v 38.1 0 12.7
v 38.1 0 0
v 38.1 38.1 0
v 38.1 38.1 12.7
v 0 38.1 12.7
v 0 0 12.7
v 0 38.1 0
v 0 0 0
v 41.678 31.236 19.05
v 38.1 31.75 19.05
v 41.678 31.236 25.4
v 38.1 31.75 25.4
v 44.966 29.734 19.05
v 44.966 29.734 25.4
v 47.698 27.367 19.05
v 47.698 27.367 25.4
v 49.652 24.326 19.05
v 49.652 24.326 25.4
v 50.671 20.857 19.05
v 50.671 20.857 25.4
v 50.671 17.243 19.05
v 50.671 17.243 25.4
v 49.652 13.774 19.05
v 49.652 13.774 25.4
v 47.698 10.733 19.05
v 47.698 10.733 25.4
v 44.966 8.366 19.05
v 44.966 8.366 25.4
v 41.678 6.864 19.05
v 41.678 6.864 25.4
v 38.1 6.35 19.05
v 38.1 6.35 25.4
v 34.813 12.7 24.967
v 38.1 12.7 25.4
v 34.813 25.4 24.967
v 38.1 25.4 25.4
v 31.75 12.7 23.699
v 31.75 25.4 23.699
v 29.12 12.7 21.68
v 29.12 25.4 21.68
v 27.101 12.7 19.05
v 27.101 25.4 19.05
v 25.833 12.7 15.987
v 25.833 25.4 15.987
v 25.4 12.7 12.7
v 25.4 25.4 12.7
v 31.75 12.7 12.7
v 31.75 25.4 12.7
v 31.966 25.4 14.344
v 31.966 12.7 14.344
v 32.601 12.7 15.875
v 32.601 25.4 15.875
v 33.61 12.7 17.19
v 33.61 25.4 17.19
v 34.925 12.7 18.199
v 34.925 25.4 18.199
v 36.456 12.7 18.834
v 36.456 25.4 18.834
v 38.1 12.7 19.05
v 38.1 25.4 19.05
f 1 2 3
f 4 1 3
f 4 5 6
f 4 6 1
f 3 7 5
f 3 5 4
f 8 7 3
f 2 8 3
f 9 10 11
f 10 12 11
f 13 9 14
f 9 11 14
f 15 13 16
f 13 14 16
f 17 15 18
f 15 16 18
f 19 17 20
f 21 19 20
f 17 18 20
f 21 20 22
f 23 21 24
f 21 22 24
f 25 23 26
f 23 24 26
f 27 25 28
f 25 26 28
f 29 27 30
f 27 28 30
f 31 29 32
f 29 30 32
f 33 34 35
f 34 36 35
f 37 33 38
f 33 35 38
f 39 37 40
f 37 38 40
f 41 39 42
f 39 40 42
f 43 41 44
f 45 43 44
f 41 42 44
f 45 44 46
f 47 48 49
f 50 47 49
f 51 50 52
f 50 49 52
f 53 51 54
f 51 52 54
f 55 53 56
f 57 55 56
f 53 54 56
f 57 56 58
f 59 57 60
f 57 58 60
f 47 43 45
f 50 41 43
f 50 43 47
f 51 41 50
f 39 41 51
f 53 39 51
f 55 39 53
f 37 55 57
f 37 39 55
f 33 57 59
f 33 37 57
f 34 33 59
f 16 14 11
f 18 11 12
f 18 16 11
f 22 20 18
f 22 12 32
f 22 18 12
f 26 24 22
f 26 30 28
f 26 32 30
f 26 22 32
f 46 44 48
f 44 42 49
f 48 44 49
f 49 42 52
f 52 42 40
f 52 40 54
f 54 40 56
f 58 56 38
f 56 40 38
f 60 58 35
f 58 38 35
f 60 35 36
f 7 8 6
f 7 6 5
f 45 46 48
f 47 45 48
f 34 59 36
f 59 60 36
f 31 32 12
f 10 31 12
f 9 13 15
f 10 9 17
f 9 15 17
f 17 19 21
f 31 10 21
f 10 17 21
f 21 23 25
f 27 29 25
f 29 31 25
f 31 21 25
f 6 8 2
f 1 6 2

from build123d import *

# Parameters (mm, degrees)
F0_W          = 38.1
F0_H          = 38.1
F1_DEPTH      = 12.7
F4_DEPTH      = 6.35
F4_DEPTH_BACK = 6.35
F5_W          = 12.7
F5_H          = 6.35
F6_ANGLE_BACK = 90
F6_ANGLE      = 180


with BuildPart() as f1:
    # F0 (on Top) → F1 (new body)
    with BuildSketch(Plane.XY):
        with Locations((19.05, 19.05)):
            Rectangle(F0_W, F0_H)
    extrude(amount=F1_DEPTH)


with BuildPart() as f4:
    # F3 (on offset) → F4 (new body, two sides)
    with BuildSketch(Plane.XZ.offset(-19.05)) as f4_sk:
        with BuildLine():
            ThreePointArc((31.75, 12.7), (33.6098719395, 17.1901280605), (38.1, 19.05))
            Line((38.1, 19.05), (38.1, 25.4))
            ThreePointArc((38.1, 25.4), (29.1197438789, 21.6802561211), (25.4, 12.7))
            Line((25.4, 12.7), (31.75, 12.7))
        make_face()
    extrude(amount=-F4_DEPTH)
    extrude(f4_sk.sketch, amount=F4_DEPTH_BACK)


with BuildPart() as f6:
    # F5 (on offset) → F6 (revolve)
    with BuildSketch(Plane.XZ.offset(-19.05), mode=Mode.PRIVATE) as f6_sk:
        with Locations((44.45, 22.225)):
            Rectangle(F5_W, F5_H)
    revolve(f6_sk.sketch.rotate(Axis((38.1, 19.05, 22.225), (0, 0, -1)), -F6_ANGLE_BACK), axis=Axis((38.1, 19.05, 22.225), (0, 0, -1)), revolution_arc=F6_ANGLE)


solid = Compound([f1.part, f4.part, f6.part])
